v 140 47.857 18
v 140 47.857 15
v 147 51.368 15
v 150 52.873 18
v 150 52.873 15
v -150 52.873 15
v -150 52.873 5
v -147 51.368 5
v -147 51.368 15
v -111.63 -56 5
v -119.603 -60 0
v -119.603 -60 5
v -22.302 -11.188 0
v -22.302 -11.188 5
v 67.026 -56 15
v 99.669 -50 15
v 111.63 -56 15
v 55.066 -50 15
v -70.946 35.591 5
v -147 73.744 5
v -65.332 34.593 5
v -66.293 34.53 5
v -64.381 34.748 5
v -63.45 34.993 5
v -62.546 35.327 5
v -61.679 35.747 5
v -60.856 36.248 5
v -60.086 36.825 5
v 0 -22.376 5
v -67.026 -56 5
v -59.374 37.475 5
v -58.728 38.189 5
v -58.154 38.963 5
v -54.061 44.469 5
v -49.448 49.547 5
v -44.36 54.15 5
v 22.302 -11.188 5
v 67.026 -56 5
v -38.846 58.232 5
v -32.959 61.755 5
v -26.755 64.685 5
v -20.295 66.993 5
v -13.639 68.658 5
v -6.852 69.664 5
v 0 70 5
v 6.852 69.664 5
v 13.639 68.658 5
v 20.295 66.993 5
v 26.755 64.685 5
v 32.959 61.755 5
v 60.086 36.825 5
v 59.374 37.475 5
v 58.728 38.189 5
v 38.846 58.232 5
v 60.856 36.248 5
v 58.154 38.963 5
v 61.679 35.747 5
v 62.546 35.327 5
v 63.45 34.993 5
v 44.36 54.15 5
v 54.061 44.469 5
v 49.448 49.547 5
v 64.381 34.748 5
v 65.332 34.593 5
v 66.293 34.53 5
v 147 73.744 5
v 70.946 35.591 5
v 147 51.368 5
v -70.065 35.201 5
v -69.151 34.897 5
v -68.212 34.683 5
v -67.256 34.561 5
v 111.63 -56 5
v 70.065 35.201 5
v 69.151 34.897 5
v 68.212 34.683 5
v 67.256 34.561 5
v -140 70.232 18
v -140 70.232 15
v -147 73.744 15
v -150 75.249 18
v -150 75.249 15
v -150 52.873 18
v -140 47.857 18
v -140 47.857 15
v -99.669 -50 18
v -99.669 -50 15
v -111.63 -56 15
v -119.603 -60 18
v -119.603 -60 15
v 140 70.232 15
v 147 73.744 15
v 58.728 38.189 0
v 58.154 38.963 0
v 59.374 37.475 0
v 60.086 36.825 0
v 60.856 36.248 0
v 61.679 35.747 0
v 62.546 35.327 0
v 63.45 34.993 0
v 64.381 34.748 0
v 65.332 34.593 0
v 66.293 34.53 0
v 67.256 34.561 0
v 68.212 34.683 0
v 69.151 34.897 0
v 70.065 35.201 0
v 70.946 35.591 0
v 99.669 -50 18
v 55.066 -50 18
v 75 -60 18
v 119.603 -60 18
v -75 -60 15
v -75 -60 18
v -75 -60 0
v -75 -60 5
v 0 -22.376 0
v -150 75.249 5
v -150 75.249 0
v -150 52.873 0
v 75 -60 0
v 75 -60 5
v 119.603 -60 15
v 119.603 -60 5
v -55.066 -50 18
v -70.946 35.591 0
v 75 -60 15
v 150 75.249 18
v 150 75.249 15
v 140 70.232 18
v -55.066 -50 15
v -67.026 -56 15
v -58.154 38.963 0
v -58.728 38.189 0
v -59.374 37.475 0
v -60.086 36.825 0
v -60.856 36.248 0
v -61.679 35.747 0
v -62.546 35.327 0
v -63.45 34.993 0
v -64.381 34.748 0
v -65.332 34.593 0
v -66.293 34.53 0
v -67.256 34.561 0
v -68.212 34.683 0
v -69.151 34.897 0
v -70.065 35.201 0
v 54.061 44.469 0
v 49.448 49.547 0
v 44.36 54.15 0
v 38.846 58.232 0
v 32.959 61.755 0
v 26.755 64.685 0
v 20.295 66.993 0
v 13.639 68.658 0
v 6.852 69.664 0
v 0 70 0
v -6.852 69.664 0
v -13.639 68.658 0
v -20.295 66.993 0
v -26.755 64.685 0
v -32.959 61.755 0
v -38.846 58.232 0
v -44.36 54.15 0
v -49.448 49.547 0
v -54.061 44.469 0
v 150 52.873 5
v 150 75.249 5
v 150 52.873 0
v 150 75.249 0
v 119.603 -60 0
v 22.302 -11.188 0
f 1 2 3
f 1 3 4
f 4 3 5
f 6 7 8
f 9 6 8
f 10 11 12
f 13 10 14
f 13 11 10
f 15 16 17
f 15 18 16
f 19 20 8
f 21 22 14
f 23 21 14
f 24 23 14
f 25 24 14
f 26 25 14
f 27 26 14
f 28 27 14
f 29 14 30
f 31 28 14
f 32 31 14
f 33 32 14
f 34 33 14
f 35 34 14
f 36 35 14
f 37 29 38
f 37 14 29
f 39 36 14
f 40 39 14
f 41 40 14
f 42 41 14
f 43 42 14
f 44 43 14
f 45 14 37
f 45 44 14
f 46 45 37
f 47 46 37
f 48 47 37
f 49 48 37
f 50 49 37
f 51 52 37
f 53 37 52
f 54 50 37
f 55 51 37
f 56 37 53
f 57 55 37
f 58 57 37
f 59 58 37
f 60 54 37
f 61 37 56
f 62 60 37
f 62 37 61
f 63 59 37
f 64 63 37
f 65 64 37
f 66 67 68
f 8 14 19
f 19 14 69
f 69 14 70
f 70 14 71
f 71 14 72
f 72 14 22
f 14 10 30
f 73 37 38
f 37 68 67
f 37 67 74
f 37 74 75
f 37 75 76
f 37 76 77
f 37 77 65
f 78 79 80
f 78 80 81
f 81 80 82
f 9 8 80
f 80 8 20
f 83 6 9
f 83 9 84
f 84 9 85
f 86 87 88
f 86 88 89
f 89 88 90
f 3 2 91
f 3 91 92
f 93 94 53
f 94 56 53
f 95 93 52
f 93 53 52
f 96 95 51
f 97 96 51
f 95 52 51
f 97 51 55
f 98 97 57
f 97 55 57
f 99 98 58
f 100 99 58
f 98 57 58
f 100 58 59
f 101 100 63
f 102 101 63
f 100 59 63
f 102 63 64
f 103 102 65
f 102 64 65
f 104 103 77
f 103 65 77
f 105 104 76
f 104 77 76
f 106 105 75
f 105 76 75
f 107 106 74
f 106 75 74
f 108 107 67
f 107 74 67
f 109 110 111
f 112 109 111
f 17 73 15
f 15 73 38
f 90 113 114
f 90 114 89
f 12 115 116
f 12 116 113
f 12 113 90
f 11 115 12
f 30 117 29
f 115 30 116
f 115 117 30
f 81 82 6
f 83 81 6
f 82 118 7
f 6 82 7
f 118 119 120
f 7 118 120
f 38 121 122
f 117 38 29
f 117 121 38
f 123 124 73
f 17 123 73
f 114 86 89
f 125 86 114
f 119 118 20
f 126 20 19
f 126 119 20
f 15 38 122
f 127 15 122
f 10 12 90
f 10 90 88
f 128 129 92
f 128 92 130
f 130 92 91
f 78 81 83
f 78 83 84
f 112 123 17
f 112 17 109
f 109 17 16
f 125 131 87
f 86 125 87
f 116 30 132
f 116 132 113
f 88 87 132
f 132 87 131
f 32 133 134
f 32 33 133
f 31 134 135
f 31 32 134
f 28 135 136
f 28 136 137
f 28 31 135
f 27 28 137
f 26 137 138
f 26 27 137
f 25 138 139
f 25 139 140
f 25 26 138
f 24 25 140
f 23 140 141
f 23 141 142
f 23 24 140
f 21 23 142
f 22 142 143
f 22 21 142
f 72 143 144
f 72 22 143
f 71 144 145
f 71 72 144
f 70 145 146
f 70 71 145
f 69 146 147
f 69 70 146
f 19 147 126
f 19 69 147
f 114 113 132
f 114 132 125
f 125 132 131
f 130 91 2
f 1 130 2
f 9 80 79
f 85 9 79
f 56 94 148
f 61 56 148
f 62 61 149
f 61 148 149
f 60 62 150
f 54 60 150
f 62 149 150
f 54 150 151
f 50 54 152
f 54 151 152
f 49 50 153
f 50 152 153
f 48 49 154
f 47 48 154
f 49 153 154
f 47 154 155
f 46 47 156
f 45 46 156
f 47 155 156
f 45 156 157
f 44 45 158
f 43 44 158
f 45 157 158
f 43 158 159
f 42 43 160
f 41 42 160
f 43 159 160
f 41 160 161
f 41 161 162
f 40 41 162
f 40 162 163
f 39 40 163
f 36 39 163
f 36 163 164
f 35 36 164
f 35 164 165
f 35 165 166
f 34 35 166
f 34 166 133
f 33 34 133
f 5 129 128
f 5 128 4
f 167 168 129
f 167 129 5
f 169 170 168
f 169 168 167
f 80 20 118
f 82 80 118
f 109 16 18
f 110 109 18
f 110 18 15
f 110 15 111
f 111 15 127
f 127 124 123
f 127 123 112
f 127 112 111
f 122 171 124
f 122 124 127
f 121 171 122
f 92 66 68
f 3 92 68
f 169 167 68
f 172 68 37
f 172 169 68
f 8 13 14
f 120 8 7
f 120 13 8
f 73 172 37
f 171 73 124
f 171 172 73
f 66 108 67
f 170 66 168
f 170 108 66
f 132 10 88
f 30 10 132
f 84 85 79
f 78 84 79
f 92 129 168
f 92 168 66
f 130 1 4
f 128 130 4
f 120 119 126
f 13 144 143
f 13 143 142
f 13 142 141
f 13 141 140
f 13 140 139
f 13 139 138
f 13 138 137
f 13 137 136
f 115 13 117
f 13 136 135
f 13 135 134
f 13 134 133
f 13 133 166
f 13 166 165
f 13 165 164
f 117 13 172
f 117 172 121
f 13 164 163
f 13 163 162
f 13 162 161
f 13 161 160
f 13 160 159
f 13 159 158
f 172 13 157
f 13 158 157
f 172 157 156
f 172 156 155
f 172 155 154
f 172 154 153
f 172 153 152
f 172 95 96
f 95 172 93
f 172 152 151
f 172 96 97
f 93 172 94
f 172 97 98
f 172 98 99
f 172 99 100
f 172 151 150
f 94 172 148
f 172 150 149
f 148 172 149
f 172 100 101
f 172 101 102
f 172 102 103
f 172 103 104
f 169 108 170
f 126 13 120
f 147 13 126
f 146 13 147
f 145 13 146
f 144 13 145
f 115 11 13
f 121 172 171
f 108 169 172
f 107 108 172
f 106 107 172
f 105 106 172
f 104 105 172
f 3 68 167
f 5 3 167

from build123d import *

# Parameters (mm, degrees)
BOSS_EXTRUDE1_DEPTH = 5
BOSS_EXTRUDE2_DEPTH = 10
BOSS_EXTRUDE3_DEPTH = 3
BOSS_EXTRUDE4_DEPTH = 5
FILLET1_R           = 10


with BuildPart() as part:
    # Sketch1 → Boss-Extrude1 (new body)
    with BuildSketch(Plane.XY):
        Polygon((-150, 75.248916092), (0, 0), (150, 75.248916092), (150, 52.873374138), (22.301525839, -11.187770977), (119.603051678, -60), (75, -60), (0, -22.375541954), (-75, -60), (-119.603051678, -60), (-22.301525839, -11.187770977), (-150, 52.873374138), align=None)
    extrude(amount=BOSS_EXTRUDE1_DEPTH)

    # Sketch2 → Boss-Extrude2 (add)
    with BuildSketch(Plane.XY.offset(5)):
        Polygon((-150, 75.248916092), (-150, 52.873374138), (-147, 51.368395816), (-147, 73.74393777), align=None)
        Polygon((150, 75.248916092), (147, 73.74393777), (147, 51.368395816), (150, 52.873374138), align=None)
        Polygon((119.603051678, -60), (111.629514899, -56), (67.026463221, -56), (75, -60), align=None)
        Polygon((-75, -60), (-119.603051678, -60), (-111.629514899, -56), (-67.026463221, -56), align=None)
    extrude(amount=BOSS_EXTRUDE2_DEPTH)

    # Sketch3 → Boss-Extrude3 (add)
    with BuildSketch(Plane.XY.offset(15)):
        Polygon((-150, 75.248916092), (-150, 52.873374138), (-140, 47.856779731), (-140, 70.232321686), align=None)
        Polygon((-75, -60), (-55.066158054, -50), (-99.669209731, -50), (-119.603051678, -60), align=None)
        Polygon((75, -60), (119.603051678, -60), (99.669209731, -50), (55.066158054, -50), align=None)
        Polygon((150, 75.248916092), (140, 70.232321686), (140, 47.856779731), (150, 52.873374138), align=None)
    extrude(amount=BOSS_EXTRUDE3_DEPTH)

    # Sketch4 → Boss-Extrude4 (add)
    with BuildSketch(Plane.XY):
        with BuildLine():
            Line((-62.568316909, 31.387986861), (0, 0))
            Line((0, 0), (62.568316909, 31.387986861))
            ThreePointArc((62.568316909, 31.387986861), (0, 70), (-62.568316909, 31.387986861))
        make_face()
    extrude(amount=BOSS_EXTRUDE4_DEPTH)

    # Fillet1
    fillet1_edges = [part.edges().sort_by_distance(p)[0] for p in [
        (62.568316909, 31.387986861, 2.5),
        (-62.568316909, 31.387986861, 2.5),
    ]]
    fillet(fillet1_edges, radius=FILLET1_R)


solid = part.part
